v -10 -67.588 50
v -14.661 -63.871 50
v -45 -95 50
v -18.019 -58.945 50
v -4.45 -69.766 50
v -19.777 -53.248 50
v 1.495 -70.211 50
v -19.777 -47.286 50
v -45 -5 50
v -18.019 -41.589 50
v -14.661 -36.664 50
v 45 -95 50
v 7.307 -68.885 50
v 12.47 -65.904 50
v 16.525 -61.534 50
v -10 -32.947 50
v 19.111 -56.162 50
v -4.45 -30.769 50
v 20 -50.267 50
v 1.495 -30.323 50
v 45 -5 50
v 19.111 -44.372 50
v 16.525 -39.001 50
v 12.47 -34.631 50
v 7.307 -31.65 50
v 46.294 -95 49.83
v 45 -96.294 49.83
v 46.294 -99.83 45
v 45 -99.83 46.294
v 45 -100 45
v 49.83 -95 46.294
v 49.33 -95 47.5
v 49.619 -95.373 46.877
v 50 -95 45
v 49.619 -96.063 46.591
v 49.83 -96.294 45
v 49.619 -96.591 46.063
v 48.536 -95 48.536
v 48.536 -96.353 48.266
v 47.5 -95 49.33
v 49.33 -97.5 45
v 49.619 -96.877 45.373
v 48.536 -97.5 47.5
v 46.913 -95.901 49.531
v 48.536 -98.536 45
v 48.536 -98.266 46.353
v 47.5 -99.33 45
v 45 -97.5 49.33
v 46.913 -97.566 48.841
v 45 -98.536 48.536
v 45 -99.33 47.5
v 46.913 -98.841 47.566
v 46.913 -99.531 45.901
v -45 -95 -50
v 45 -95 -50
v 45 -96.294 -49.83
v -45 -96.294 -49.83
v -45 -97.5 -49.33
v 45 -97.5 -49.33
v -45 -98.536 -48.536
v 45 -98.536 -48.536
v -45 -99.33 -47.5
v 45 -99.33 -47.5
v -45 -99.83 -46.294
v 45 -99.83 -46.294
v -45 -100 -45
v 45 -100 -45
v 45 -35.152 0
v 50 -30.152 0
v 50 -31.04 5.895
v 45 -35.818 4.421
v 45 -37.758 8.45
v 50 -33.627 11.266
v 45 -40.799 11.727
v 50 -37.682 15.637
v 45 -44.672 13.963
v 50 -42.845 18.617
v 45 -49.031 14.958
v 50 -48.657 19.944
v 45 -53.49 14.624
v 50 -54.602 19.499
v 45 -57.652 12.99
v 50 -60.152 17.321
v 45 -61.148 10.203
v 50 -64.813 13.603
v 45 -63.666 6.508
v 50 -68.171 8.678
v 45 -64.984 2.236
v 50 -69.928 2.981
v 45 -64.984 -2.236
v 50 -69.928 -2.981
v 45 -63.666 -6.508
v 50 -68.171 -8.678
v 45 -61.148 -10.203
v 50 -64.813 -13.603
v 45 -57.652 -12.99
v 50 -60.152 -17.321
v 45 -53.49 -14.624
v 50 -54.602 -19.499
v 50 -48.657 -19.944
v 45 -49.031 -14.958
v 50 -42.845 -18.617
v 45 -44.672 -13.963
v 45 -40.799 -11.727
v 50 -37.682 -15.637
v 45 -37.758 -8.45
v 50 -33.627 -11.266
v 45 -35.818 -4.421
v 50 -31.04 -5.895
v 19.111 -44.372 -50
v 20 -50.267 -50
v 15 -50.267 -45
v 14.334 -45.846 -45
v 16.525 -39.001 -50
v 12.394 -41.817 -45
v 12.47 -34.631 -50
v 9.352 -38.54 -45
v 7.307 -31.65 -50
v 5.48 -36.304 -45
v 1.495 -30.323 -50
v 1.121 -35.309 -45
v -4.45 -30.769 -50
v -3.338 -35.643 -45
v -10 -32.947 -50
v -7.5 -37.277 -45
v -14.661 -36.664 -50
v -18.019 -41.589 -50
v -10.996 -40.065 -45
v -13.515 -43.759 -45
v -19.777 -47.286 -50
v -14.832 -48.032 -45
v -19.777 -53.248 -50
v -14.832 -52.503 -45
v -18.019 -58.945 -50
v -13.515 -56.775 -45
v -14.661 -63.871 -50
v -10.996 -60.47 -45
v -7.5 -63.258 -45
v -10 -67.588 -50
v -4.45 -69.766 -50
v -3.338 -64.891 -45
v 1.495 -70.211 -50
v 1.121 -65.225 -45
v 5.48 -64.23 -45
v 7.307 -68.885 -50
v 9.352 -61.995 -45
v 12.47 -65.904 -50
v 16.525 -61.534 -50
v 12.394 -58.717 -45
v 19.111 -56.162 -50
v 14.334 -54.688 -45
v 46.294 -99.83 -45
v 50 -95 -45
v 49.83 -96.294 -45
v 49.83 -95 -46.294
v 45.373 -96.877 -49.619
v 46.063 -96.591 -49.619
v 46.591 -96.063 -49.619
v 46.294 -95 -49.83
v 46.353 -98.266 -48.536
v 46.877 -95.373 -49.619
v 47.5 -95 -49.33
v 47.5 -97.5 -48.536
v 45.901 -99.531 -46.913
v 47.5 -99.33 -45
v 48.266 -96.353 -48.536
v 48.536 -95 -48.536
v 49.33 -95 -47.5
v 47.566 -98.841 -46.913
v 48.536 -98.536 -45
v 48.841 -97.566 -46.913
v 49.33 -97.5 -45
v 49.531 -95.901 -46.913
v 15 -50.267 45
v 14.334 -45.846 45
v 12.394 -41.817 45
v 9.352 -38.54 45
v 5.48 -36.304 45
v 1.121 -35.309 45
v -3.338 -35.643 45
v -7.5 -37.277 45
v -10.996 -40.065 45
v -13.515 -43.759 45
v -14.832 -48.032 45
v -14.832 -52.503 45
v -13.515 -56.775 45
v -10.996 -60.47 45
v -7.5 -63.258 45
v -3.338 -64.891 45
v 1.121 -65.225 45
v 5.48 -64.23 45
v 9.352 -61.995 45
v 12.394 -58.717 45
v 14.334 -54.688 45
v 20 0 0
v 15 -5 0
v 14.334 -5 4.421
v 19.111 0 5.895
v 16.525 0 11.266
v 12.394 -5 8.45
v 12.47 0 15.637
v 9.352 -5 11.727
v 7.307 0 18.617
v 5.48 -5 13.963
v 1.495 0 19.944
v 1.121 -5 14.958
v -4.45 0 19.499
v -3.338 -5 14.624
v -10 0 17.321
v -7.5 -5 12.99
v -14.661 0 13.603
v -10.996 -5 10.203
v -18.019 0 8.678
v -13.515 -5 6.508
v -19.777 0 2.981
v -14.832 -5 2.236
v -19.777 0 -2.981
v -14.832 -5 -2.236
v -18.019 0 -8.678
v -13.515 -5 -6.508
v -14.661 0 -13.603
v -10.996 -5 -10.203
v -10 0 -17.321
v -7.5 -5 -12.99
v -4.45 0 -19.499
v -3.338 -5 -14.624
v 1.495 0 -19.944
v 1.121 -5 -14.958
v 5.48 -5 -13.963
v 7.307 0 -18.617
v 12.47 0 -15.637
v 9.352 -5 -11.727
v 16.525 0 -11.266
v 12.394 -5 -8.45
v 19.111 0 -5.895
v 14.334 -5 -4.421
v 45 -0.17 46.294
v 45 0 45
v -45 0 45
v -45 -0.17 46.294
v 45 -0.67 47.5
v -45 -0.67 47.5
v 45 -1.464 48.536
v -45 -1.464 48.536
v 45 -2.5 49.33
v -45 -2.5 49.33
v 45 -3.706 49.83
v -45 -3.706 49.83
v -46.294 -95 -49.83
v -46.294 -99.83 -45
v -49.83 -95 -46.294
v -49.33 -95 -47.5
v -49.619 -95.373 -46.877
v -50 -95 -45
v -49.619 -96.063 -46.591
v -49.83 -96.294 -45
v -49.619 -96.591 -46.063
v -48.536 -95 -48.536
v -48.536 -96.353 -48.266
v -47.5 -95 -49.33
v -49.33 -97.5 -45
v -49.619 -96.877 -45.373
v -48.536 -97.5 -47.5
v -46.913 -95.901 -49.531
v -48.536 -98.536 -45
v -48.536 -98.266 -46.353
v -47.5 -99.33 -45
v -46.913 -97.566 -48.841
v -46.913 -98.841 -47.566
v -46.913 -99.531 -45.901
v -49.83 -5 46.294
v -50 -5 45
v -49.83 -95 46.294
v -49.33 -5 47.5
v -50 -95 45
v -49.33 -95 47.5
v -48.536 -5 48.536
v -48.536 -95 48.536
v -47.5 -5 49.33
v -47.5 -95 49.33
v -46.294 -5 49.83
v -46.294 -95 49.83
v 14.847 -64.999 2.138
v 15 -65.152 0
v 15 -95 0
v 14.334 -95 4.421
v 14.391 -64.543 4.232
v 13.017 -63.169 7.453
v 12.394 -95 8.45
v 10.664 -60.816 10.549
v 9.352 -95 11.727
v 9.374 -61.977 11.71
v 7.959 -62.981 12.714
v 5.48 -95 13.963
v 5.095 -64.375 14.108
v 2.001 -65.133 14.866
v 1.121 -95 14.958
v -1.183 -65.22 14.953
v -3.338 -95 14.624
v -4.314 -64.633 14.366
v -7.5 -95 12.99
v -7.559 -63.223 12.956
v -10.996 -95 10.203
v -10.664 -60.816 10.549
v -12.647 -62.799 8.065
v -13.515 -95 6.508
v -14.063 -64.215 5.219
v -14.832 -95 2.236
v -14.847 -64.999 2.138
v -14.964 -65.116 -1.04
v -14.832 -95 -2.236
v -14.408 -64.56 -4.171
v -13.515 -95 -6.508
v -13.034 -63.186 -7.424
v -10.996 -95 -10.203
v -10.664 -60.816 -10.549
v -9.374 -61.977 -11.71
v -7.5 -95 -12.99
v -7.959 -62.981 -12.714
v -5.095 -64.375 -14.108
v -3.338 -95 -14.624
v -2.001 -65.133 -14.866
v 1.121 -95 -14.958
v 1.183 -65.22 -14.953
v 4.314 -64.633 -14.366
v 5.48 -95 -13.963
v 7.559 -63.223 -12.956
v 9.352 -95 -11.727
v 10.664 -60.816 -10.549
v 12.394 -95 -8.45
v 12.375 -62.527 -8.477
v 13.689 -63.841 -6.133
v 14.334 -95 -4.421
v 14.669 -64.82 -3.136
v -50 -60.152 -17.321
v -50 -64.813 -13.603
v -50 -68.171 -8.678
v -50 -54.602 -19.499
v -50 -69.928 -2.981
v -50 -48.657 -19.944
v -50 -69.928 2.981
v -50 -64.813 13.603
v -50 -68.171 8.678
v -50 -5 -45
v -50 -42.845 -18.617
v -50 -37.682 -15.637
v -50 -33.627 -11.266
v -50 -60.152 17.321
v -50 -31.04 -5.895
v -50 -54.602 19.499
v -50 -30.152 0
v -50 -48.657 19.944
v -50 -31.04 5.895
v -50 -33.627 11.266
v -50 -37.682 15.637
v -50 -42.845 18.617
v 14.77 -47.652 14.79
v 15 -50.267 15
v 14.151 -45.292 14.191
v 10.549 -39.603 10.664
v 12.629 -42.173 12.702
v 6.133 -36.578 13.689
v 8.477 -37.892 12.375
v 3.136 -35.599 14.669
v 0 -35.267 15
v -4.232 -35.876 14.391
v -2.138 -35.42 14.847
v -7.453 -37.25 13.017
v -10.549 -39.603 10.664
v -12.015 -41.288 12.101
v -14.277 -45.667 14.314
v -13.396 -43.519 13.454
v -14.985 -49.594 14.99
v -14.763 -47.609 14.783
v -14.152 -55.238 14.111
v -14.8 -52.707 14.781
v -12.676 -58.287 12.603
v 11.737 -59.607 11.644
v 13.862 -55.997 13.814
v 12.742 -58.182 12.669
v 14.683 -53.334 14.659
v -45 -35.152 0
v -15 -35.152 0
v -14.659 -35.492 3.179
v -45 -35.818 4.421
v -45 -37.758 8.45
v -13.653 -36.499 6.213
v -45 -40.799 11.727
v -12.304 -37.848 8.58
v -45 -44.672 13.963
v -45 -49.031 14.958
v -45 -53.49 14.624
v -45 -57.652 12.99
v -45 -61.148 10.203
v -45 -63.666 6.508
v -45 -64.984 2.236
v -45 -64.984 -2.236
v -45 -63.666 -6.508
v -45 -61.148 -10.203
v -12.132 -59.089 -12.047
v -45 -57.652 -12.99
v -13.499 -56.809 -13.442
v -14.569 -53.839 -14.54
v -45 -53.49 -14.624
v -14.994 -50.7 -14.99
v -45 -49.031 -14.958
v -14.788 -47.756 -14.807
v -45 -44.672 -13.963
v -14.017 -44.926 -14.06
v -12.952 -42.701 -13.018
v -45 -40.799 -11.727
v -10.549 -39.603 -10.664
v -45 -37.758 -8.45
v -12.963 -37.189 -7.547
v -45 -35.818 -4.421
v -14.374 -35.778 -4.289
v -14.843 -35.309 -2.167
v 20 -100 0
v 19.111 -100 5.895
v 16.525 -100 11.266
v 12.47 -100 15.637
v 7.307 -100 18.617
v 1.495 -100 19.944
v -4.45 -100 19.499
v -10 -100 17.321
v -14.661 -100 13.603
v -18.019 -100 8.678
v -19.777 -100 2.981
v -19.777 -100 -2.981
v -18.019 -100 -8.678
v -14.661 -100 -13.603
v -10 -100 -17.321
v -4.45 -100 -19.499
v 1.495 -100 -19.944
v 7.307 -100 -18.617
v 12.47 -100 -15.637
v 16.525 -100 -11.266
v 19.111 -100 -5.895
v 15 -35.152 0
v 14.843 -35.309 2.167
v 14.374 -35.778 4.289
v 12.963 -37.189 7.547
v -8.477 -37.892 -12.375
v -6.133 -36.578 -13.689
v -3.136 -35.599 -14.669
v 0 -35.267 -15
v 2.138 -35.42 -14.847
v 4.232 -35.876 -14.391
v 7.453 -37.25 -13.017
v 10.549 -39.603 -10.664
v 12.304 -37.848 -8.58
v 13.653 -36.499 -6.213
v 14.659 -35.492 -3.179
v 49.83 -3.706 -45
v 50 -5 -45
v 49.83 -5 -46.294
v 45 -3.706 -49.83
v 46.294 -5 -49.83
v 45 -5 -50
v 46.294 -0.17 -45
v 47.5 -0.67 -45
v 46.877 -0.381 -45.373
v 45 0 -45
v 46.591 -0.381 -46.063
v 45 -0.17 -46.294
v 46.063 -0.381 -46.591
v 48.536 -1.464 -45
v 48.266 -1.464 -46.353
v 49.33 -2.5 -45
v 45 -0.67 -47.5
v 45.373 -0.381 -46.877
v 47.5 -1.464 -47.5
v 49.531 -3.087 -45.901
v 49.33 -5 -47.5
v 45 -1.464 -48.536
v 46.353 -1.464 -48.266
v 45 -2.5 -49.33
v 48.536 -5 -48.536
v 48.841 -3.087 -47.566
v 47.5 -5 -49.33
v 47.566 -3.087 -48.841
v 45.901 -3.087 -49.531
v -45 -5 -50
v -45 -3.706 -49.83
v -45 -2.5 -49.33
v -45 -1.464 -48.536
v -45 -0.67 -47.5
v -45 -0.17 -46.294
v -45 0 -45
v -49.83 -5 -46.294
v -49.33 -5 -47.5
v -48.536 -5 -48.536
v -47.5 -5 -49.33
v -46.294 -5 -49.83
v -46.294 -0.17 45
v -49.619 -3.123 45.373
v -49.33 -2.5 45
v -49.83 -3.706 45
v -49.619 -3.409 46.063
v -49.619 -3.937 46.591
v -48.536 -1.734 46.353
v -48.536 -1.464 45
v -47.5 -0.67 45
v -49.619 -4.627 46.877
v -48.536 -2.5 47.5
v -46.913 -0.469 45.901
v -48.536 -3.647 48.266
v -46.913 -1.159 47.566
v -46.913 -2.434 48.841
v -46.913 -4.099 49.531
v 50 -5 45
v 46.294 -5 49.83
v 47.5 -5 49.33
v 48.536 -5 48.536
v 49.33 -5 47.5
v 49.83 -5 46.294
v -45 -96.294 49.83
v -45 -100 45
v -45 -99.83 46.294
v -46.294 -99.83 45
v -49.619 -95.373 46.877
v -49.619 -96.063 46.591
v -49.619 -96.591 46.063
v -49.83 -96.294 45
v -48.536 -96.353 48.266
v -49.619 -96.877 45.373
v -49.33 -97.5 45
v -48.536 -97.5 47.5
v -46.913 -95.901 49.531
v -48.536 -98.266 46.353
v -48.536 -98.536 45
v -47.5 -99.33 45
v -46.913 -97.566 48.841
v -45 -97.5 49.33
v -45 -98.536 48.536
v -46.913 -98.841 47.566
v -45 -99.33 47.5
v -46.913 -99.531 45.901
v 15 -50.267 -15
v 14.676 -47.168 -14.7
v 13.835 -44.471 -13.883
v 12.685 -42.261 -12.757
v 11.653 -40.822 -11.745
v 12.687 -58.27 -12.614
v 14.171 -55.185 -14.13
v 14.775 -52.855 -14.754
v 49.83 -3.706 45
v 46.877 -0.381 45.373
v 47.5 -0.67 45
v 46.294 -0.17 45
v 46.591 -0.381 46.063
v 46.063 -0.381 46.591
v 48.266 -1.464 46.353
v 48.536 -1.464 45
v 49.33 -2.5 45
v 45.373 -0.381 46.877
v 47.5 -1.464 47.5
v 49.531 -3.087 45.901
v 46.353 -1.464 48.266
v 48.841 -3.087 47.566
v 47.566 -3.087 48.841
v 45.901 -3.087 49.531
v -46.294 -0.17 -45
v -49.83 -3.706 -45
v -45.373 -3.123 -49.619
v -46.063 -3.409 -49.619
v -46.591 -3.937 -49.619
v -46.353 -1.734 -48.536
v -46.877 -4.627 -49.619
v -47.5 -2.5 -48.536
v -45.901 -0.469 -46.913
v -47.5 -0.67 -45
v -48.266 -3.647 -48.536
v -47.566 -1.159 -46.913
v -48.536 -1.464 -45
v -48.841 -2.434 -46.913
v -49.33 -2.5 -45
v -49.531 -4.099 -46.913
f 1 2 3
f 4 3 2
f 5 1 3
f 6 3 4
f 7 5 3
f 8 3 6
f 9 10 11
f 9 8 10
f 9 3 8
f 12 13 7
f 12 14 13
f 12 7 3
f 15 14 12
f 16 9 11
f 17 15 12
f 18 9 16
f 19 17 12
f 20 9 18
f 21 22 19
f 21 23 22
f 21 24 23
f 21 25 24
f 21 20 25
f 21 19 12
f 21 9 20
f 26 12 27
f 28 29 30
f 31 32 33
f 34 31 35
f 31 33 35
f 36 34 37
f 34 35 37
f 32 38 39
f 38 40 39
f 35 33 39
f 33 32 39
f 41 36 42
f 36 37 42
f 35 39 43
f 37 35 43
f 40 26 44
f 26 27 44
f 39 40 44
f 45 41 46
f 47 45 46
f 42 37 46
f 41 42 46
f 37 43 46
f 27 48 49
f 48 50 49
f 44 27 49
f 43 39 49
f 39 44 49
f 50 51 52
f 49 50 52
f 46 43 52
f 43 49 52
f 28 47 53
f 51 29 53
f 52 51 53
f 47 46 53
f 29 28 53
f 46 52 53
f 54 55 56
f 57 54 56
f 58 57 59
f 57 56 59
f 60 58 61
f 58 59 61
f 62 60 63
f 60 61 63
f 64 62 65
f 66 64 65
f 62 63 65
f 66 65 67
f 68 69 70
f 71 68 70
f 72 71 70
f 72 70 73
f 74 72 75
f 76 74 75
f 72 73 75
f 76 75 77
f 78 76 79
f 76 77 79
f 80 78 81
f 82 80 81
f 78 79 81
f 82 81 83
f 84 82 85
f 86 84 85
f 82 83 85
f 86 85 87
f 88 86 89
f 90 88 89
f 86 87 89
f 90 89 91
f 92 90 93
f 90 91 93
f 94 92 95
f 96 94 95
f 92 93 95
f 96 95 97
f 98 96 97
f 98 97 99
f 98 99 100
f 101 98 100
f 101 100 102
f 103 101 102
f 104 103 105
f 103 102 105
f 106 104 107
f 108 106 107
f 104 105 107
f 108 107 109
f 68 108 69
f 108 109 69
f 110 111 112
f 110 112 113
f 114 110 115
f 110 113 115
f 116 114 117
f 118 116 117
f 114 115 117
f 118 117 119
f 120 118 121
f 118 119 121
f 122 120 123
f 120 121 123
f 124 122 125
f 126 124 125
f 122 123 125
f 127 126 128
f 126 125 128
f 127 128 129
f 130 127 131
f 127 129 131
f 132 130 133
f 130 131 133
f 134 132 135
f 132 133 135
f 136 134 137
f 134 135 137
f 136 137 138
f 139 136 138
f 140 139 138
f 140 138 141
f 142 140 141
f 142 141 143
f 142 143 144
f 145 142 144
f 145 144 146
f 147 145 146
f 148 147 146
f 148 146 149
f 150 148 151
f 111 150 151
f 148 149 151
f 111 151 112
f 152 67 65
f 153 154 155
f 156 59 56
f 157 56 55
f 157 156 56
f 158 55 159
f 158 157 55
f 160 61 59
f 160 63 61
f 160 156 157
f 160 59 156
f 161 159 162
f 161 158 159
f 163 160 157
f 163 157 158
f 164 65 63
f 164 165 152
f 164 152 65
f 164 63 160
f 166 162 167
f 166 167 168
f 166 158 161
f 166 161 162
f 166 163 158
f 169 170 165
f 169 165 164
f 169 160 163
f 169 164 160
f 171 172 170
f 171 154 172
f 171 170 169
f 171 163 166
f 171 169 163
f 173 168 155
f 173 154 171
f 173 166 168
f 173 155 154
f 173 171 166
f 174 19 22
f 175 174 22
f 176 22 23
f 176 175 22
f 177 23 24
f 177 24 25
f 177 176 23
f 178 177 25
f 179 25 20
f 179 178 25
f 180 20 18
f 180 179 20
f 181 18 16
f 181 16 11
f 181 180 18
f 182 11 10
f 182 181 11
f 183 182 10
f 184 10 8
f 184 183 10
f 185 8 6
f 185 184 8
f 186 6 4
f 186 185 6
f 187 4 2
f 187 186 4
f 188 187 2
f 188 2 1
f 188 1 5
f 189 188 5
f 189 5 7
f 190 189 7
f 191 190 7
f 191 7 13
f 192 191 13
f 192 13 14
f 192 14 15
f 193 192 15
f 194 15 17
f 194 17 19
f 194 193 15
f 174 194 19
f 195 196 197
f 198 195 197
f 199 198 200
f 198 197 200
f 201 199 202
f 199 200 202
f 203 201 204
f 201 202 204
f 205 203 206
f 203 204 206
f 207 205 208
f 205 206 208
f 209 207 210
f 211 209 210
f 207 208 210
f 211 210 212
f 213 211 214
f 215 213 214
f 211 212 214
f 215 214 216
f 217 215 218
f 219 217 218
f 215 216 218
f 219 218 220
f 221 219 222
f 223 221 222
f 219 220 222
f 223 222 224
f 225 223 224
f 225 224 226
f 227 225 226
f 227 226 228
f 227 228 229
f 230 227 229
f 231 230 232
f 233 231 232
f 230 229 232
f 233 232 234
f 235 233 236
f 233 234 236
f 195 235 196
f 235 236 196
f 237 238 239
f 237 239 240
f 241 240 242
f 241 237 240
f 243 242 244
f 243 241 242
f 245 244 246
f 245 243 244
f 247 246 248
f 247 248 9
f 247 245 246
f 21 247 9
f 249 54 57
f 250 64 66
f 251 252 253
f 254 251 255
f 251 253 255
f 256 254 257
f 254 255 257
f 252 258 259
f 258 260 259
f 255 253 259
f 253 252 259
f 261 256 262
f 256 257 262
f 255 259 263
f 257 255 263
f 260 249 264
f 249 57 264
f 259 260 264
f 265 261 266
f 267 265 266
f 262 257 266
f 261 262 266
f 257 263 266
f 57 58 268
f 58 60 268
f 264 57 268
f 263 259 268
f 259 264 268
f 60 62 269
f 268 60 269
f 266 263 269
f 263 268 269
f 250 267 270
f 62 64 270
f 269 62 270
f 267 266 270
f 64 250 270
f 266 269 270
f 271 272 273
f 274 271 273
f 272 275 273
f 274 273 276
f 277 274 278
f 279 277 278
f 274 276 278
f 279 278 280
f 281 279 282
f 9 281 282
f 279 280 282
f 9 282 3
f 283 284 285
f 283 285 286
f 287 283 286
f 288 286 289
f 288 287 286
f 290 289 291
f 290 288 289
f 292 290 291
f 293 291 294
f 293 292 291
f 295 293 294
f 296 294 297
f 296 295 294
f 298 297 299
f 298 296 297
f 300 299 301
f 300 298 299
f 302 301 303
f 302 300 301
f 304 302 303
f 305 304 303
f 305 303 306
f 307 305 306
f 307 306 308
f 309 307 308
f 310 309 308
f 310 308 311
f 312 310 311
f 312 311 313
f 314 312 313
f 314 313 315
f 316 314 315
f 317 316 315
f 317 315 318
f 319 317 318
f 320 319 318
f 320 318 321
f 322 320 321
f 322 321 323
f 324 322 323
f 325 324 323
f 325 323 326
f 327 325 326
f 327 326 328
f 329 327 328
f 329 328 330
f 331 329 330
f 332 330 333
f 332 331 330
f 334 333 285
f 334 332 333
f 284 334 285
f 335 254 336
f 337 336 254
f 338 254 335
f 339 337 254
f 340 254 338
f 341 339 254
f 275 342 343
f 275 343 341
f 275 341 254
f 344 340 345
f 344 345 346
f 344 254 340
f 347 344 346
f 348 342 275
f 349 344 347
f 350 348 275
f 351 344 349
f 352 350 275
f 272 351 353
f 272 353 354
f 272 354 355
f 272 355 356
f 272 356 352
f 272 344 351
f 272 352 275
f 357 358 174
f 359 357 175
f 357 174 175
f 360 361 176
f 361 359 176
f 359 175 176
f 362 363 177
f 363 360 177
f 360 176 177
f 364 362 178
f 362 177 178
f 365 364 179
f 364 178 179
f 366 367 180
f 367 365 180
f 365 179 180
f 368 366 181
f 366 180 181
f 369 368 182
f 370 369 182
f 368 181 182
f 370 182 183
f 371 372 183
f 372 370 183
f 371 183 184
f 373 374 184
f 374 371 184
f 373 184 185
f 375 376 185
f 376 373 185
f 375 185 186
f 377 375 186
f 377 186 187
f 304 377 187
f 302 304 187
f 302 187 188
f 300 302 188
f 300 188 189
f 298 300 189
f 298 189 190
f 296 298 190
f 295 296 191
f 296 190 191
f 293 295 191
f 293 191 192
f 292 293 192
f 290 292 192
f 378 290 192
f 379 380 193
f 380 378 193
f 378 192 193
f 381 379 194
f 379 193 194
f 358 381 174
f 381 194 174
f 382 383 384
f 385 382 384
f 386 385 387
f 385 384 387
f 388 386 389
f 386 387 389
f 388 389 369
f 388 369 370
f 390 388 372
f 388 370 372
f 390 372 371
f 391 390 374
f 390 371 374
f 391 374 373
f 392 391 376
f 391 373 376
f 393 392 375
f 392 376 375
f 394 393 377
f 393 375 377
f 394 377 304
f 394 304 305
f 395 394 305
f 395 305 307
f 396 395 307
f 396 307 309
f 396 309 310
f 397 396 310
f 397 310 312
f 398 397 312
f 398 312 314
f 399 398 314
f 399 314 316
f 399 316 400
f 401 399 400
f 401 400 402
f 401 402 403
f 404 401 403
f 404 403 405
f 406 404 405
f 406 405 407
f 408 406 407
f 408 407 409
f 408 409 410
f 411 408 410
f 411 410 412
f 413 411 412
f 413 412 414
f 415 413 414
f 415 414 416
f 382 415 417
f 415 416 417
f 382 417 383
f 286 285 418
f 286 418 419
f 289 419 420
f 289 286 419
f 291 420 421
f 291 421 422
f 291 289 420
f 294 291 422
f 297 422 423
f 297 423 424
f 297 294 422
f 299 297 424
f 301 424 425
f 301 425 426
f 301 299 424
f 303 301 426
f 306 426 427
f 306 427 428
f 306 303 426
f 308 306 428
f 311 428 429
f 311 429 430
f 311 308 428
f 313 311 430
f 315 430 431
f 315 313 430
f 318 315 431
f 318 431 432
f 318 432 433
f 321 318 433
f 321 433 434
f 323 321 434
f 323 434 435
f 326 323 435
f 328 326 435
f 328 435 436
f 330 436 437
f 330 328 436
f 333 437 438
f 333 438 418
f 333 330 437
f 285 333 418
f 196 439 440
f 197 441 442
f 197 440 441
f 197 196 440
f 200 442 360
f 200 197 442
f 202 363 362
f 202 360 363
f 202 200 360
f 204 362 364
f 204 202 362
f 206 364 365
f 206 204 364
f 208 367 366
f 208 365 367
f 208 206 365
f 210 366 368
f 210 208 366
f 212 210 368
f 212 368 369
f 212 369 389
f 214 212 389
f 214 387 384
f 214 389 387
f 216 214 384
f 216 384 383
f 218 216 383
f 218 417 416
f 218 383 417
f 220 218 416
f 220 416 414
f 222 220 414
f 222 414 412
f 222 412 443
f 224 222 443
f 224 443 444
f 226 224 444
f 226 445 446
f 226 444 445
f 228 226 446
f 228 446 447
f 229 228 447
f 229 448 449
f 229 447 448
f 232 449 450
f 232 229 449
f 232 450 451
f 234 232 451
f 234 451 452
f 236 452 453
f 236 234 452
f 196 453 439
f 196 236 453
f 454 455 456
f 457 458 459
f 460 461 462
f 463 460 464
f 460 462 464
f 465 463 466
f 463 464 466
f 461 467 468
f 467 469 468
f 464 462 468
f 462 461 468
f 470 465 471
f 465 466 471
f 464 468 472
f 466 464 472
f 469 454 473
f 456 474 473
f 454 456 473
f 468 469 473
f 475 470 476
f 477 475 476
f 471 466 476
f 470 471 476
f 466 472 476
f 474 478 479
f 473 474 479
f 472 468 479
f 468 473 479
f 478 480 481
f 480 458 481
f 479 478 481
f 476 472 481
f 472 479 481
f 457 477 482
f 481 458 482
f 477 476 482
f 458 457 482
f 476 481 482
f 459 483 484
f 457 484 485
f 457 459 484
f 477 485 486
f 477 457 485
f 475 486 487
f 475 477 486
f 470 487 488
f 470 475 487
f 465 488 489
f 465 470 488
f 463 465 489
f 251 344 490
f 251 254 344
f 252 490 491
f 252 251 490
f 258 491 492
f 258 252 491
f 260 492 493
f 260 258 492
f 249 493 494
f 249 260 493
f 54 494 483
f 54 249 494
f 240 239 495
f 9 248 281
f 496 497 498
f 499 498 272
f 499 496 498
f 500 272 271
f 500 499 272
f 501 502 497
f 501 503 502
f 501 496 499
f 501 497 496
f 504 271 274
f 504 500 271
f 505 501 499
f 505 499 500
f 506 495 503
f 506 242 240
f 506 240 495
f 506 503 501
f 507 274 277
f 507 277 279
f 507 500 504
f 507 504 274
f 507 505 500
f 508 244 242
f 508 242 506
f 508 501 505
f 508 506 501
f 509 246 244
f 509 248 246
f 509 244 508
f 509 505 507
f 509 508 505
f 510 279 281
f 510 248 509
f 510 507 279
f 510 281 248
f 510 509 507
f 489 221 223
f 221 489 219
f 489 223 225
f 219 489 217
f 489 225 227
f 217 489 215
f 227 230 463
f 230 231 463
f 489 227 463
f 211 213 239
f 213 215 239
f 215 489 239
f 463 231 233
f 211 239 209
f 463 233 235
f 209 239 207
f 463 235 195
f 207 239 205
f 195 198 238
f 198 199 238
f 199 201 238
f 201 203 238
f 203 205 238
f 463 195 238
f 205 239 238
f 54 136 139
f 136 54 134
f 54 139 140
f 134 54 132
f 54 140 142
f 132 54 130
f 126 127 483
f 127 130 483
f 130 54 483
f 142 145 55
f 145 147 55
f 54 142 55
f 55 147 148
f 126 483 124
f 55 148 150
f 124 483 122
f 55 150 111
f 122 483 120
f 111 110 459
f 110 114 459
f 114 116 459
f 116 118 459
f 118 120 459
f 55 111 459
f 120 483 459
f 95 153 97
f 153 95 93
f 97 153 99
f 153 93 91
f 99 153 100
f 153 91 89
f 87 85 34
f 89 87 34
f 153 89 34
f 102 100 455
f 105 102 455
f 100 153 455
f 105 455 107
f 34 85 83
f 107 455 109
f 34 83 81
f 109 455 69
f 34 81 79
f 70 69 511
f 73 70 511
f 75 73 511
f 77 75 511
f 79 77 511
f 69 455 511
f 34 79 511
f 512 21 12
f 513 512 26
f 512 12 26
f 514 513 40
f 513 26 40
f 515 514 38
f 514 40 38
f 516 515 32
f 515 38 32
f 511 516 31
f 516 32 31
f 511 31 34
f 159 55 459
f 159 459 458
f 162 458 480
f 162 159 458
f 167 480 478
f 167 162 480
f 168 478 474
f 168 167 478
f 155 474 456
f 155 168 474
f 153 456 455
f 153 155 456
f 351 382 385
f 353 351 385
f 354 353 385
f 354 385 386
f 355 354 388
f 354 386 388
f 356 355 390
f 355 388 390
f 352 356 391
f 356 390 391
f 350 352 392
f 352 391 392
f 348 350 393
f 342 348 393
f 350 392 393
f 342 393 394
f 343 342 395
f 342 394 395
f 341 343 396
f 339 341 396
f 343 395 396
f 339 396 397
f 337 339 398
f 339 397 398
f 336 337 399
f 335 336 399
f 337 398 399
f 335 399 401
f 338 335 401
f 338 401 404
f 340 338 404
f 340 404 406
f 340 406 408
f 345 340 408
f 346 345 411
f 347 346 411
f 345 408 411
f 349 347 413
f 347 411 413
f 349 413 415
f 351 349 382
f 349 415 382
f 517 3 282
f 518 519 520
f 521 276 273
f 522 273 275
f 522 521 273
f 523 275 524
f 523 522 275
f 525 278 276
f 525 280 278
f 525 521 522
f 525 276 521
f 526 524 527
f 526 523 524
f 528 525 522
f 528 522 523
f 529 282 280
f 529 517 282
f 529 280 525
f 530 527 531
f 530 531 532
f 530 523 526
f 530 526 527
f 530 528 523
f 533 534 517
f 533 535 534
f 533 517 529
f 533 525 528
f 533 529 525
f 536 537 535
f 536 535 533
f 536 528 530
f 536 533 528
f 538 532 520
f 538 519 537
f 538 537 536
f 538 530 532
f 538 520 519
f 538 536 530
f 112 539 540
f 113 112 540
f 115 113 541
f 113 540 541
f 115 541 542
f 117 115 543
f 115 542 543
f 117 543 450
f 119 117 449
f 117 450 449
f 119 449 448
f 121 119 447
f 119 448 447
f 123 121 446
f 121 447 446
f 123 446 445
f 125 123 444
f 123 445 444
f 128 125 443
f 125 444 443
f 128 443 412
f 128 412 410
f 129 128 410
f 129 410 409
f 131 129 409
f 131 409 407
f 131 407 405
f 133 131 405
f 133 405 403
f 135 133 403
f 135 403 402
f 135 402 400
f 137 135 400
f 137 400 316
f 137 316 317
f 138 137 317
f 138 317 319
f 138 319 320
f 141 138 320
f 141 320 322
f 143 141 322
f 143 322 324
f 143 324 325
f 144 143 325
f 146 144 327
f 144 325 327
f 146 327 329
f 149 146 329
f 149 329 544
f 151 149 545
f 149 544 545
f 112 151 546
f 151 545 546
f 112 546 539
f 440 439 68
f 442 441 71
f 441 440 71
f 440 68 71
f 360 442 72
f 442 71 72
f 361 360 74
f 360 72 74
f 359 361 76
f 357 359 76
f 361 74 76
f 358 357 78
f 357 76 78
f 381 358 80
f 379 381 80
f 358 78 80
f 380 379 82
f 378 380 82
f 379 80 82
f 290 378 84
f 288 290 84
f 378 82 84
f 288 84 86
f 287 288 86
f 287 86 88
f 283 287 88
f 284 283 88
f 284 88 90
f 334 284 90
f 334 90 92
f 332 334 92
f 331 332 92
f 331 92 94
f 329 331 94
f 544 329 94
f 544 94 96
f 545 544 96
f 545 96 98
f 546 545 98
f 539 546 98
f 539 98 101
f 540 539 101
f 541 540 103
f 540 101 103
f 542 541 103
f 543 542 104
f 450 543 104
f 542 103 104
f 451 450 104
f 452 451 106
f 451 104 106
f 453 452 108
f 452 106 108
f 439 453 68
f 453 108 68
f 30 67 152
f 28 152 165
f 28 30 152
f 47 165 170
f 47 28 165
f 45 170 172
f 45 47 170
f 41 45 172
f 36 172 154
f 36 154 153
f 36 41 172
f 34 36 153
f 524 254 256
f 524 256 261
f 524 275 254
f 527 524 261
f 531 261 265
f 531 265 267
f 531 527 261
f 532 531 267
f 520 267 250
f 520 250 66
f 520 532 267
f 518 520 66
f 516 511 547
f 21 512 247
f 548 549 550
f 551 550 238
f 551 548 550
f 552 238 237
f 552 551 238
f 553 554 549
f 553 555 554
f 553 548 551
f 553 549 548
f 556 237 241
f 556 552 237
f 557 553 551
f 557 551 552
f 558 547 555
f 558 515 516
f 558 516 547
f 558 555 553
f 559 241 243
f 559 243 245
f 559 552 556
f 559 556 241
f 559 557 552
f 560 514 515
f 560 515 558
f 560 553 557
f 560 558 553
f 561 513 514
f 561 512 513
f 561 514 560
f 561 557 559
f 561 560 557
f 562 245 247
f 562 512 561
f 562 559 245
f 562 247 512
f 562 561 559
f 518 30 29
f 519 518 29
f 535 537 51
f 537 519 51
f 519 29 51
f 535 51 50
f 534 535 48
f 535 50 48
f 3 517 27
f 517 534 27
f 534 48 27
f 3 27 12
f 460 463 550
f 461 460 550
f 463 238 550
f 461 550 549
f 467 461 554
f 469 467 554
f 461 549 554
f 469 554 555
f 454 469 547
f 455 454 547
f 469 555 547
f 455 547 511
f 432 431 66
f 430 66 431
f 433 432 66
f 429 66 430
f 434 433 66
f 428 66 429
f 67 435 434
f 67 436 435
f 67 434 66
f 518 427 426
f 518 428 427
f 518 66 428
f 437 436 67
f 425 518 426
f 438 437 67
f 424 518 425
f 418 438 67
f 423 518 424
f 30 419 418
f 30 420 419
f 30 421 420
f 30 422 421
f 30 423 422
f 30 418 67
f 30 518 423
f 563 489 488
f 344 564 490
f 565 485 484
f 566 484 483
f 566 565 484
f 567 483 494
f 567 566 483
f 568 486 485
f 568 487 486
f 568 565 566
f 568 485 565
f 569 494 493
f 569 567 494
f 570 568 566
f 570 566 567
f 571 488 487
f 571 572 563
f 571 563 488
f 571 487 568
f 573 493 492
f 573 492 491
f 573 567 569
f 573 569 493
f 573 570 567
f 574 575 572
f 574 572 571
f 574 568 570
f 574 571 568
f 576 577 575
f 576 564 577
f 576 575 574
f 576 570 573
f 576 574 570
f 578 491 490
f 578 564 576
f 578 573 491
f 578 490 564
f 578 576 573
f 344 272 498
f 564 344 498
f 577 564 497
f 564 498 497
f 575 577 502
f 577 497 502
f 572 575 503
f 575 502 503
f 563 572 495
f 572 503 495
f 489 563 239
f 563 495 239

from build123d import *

# Parameters (mm, degrees)
F0_W     = 100
F0_H     = 100
F0_R     = 15
F1_DEPTH = 100
F2_R     = 15
F3_DEPTH = 100
F4_R     = 15
F5_DEPTH = 100
F6_R     = 5
F7_SIZE  = 5


with BuildPart() as f1:
    # F0 (on Front) → F1 (new body)
    with BuildSketch(Plane.XZ):
        Rectangle(F0_W, F0_H)
        Circle(F0_R, mode=Mode.SUBTRACT)
    extrude(amount=F1_DEPTH)

    # F2 (on face) → F3 (cut)
    with BuildSketch(Plane.YZ.offset(50)):
        with Locations((-50.151795, 0)):
            Circle(F2_R)
    extrude(amount=-F3_DEPTH, mode=Mode.SUBTRACT)

    # F4 (on face) → F5 (cut)
    with BuildSketch(Plane.XY.offset(50)):
        with Locations((0, -50.267148)):
            Circle(F4_R)
    extrude(amount=-F5_DEPTH, mode=Mode.SUBTRACT)

    # F6
    f6_edges = [f1.edges().sort_by_distance(p)[0] for p in [
        (0, -100, 50),
        (50, -50, 50),
        (50, -100, 0),
        (0, -100, -50),
        (50, -50, -50),
        (50, 0, 0),
        (0, 0, 50),
        (-50, 0, 0),
        (0, 0, -50),
        (-50, -50, -50),
        (-50, -50, 50),
        (-50, -100, 0),
    ]]
    fillet(f6_edges, radius=F6_R)

    # F7
    f7_edges = [f1.edges().sort_by_distance(p)[0] for p in [
        (-15, -100, 0),
        (-15, -50.267148, 50),
        (50, -65.151795, 0),
        (-15, 0, 0),
        (-15, -50.267148, -50),
        (-50, -65.151795, 0),
    ]]
    chamfer(f7_edges, length=F7_SIZE)


solid = f1.part
